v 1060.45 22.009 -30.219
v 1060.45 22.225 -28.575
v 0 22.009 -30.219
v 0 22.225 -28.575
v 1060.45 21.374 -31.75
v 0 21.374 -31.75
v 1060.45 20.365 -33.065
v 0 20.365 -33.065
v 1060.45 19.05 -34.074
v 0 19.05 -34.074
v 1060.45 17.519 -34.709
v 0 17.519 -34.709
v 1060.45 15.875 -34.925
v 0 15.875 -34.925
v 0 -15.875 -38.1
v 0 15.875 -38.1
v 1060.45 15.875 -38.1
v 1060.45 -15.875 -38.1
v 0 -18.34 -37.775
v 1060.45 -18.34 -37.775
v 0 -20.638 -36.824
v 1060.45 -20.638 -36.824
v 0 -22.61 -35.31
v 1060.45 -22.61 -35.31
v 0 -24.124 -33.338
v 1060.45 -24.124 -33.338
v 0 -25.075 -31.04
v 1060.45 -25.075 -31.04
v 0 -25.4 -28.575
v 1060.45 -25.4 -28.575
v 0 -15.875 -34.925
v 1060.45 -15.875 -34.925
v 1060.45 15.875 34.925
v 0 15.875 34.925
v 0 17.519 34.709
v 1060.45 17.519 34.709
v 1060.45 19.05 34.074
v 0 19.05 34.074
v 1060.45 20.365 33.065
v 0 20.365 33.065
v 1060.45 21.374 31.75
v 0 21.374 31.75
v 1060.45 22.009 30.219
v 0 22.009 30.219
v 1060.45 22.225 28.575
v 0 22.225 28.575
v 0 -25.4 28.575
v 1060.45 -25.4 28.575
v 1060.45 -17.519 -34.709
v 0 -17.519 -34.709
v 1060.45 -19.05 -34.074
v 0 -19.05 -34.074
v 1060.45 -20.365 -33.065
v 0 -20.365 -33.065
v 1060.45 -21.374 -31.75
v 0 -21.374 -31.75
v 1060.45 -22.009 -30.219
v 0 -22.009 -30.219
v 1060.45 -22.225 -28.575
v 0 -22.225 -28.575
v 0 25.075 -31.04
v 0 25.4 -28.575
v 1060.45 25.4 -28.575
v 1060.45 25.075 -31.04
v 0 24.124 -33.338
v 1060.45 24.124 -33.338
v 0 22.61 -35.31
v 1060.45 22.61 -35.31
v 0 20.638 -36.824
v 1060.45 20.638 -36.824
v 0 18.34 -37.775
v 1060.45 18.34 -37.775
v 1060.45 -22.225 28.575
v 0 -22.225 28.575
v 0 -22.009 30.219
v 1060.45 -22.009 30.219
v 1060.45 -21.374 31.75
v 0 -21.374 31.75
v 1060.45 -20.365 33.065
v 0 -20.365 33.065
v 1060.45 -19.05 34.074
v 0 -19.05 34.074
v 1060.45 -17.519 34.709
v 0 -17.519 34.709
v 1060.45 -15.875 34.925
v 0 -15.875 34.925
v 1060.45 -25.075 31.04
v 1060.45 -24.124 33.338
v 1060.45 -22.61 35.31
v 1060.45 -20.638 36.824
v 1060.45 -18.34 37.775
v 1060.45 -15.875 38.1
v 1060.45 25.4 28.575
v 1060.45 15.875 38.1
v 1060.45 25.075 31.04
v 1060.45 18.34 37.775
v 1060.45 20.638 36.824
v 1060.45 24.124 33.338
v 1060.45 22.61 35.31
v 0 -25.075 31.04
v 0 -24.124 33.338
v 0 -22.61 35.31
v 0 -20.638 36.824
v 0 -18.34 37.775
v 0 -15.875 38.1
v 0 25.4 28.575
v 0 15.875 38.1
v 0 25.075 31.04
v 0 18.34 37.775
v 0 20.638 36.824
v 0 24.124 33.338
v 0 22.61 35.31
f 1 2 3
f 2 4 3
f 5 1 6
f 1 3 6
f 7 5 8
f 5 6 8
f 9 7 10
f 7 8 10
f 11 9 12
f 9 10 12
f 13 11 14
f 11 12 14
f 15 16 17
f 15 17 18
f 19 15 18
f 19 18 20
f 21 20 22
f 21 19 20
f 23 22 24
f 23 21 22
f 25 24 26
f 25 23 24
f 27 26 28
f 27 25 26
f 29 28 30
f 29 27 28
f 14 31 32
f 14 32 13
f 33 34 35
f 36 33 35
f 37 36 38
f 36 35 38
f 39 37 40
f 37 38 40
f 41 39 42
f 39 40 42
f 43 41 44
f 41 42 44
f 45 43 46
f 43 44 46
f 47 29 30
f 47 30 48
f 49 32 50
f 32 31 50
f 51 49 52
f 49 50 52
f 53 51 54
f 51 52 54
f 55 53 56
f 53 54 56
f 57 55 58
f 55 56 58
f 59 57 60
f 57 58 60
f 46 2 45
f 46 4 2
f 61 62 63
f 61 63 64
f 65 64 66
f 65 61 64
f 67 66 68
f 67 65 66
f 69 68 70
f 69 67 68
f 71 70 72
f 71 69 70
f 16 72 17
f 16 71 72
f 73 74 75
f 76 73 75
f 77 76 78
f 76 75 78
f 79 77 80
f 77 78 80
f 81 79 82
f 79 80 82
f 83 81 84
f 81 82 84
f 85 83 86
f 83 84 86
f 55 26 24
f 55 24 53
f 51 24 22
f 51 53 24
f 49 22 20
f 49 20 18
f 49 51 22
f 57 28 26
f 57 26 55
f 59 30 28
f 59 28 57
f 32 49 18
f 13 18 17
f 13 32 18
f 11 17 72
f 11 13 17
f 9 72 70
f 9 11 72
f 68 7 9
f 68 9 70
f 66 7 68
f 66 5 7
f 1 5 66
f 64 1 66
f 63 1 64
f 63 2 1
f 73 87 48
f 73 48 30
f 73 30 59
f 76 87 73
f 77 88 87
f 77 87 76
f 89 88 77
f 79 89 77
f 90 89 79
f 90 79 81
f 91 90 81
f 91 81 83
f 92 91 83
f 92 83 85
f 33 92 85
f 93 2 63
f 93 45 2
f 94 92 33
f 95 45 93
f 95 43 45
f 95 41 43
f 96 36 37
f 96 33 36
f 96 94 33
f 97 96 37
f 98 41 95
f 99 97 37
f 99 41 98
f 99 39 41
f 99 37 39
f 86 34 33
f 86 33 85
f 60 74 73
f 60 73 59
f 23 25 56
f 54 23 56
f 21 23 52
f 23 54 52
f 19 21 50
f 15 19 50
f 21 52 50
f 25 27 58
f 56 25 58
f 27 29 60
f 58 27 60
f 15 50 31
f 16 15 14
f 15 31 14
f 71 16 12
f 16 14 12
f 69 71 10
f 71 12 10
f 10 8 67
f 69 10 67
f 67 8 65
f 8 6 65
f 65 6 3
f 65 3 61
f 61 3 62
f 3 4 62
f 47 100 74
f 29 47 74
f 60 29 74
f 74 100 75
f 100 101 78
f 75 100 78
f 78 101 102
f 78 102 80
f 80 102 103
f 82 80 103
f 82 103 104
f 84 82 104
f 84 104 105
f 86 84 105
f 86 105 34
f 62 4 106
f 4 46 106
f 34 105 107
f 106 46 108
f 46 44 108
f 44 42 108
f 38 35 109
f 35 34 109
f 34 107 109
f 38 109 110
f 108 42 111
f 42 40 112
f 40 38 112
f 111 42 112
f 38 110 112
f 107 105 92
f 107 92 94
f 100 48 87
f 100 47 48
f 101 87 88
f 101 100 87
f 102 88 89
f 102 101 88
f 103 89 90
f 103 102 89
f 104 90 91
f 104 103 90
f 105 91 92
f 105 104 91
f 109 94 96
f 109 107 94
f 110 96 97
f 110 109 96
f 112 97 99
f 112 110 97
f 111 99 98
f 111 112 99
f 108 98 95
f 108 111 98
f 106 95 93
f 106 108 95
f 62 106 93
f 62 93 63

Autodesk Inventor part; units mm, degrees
ref_plane "YZ Plane" through (0, 0, 0) normal (1, 0, 0) x (0, 1, 0)
ref_plane "XZ Plane" through (0, 0, 0) normal (0, 1, 0) x (-1, 0, 0)
ref_plane "XY Plane" through (0, 0, 0) normal (0, 0, 1) x (1, 0, 0)
sketch "Sketch1" plane through (0, 0, 0) normal (1, 0, 0) x (0, 1, 0)
  line L0 (-15.875, 38.1) -> (15.875, 38.1)
  line L1 (25.4, 28.575) -> (25.4, -28.575)
  line L2 (15.875, -38.1) -> (-15.875, -38.1)
  line L3 (-25.4, -28.575) -> (-25.4, 28.575)
  line L4 (-25.4, 38.1) -> (25.4, -38.1) construction
  line L5 (25.4, 38.1) -> (-25.4, -38.1) construction
  arc A0 (25.4, 28.575) -> (15.875, 38.1) centre (15.875, 28.575) ccw
  arc A1 (-15.875, 38.1) -> (-25.4, 28.575) centre (-15.875, 28.575) ccw
  arc A2 (-25.4, -28.575) -> (-15.875, -38.1) centre (-15.875, -28.575) ccw
  arc A3 (15.875, -38.1) -> (25.4, -28.575) centre (15.875, -28.575) ccw
  line L6 (22.225, -28.575) -> (22.225, 28.575)
  arc A4 (22.225, 28.575) -> (15.875, 34.925) centre (15.875, 28.575) ccw
  line L7 (15.875, 34.925) -> (-15.875, 34.925)
  arc A5 (-15.875, 34.925) -> (-22.225, 28.575) centre (-15.875, 28.575) ccw
  line L8 (-22.225, 28.575) -> (-22.225, -28.575)
  arc A6 (-22.225, -28.575) -> (-15.875, -34.925) centre (-15.875, -28.575) ccw
  line L9 (-15.875, -34.925) -> (15.875, -34.925)
  arc A7 (15.875, -34.925) -> (22.225, -28.575) centre (15.875, -28.575) ccw
  point P0 (0, 0)
  dimension "d0" = 50.8
  dimension "d1" = 76.2
  dimension "d2" = 9.525
  dimension "d3" = 3.175
extrude "Extrusion1" add sketch "Sketch1" along normal blind 1060.45
equation "\"d0\" = stockHeight"
equation "\"d1\" = stockWidth"
equation "\"d2\" = stockRad"
equation "\"d3\" = stockGuage"
equation "\"d4\" = baseWidth - 2 * capThickness"
equation "\"height\" = 203.2"
equation "\"shaftDiam\" = 6.35"
equation "\"shaftSpace\" = 1.5875"
equation "\"stageSpace\" = 2.54"
equation "\"stageAngle\" = 15deg"
equation "\"stockHeight\" = 50.8"
equation "\"stockWidth\" = 76.2"
equation "\"stockRad\" = 9.525"
equation "\"stockGuage\" = 3.175"
equation "\"groundActu\" = 304.8"
equation "\"baseWidth\" = 1066.8"
equation "\"baseDepth\" = 254"
equation "\"capThickness\" = 3.175"
equation "\"sup1Ang\" = 22.619865deg"
equation "\"sup1Len\" = 660.4"
equation "\"supVertLen\" = 955.13561"
equation "\"sup2Ang\" = 8.959949deg"
equation "\"sup2Len\" = 2079.37366"
equation "\"supSideAng\" = 19.376933deg"
equation "\"supSideLen\" = 1531.12879"
equation "\"FlangeDiam\" = 12.7"
equation "\"bearingDiam\" = 9.5504"
equation "\"FlangeDepth\" = 1.5875"
equation "\"smallFilet\" = 0.39687"
equation "\"thickness\" = 12.7"
equation "\"ringDiam\" = 96.46608"
properties part number "base bar" material "Aluminum 6061"
